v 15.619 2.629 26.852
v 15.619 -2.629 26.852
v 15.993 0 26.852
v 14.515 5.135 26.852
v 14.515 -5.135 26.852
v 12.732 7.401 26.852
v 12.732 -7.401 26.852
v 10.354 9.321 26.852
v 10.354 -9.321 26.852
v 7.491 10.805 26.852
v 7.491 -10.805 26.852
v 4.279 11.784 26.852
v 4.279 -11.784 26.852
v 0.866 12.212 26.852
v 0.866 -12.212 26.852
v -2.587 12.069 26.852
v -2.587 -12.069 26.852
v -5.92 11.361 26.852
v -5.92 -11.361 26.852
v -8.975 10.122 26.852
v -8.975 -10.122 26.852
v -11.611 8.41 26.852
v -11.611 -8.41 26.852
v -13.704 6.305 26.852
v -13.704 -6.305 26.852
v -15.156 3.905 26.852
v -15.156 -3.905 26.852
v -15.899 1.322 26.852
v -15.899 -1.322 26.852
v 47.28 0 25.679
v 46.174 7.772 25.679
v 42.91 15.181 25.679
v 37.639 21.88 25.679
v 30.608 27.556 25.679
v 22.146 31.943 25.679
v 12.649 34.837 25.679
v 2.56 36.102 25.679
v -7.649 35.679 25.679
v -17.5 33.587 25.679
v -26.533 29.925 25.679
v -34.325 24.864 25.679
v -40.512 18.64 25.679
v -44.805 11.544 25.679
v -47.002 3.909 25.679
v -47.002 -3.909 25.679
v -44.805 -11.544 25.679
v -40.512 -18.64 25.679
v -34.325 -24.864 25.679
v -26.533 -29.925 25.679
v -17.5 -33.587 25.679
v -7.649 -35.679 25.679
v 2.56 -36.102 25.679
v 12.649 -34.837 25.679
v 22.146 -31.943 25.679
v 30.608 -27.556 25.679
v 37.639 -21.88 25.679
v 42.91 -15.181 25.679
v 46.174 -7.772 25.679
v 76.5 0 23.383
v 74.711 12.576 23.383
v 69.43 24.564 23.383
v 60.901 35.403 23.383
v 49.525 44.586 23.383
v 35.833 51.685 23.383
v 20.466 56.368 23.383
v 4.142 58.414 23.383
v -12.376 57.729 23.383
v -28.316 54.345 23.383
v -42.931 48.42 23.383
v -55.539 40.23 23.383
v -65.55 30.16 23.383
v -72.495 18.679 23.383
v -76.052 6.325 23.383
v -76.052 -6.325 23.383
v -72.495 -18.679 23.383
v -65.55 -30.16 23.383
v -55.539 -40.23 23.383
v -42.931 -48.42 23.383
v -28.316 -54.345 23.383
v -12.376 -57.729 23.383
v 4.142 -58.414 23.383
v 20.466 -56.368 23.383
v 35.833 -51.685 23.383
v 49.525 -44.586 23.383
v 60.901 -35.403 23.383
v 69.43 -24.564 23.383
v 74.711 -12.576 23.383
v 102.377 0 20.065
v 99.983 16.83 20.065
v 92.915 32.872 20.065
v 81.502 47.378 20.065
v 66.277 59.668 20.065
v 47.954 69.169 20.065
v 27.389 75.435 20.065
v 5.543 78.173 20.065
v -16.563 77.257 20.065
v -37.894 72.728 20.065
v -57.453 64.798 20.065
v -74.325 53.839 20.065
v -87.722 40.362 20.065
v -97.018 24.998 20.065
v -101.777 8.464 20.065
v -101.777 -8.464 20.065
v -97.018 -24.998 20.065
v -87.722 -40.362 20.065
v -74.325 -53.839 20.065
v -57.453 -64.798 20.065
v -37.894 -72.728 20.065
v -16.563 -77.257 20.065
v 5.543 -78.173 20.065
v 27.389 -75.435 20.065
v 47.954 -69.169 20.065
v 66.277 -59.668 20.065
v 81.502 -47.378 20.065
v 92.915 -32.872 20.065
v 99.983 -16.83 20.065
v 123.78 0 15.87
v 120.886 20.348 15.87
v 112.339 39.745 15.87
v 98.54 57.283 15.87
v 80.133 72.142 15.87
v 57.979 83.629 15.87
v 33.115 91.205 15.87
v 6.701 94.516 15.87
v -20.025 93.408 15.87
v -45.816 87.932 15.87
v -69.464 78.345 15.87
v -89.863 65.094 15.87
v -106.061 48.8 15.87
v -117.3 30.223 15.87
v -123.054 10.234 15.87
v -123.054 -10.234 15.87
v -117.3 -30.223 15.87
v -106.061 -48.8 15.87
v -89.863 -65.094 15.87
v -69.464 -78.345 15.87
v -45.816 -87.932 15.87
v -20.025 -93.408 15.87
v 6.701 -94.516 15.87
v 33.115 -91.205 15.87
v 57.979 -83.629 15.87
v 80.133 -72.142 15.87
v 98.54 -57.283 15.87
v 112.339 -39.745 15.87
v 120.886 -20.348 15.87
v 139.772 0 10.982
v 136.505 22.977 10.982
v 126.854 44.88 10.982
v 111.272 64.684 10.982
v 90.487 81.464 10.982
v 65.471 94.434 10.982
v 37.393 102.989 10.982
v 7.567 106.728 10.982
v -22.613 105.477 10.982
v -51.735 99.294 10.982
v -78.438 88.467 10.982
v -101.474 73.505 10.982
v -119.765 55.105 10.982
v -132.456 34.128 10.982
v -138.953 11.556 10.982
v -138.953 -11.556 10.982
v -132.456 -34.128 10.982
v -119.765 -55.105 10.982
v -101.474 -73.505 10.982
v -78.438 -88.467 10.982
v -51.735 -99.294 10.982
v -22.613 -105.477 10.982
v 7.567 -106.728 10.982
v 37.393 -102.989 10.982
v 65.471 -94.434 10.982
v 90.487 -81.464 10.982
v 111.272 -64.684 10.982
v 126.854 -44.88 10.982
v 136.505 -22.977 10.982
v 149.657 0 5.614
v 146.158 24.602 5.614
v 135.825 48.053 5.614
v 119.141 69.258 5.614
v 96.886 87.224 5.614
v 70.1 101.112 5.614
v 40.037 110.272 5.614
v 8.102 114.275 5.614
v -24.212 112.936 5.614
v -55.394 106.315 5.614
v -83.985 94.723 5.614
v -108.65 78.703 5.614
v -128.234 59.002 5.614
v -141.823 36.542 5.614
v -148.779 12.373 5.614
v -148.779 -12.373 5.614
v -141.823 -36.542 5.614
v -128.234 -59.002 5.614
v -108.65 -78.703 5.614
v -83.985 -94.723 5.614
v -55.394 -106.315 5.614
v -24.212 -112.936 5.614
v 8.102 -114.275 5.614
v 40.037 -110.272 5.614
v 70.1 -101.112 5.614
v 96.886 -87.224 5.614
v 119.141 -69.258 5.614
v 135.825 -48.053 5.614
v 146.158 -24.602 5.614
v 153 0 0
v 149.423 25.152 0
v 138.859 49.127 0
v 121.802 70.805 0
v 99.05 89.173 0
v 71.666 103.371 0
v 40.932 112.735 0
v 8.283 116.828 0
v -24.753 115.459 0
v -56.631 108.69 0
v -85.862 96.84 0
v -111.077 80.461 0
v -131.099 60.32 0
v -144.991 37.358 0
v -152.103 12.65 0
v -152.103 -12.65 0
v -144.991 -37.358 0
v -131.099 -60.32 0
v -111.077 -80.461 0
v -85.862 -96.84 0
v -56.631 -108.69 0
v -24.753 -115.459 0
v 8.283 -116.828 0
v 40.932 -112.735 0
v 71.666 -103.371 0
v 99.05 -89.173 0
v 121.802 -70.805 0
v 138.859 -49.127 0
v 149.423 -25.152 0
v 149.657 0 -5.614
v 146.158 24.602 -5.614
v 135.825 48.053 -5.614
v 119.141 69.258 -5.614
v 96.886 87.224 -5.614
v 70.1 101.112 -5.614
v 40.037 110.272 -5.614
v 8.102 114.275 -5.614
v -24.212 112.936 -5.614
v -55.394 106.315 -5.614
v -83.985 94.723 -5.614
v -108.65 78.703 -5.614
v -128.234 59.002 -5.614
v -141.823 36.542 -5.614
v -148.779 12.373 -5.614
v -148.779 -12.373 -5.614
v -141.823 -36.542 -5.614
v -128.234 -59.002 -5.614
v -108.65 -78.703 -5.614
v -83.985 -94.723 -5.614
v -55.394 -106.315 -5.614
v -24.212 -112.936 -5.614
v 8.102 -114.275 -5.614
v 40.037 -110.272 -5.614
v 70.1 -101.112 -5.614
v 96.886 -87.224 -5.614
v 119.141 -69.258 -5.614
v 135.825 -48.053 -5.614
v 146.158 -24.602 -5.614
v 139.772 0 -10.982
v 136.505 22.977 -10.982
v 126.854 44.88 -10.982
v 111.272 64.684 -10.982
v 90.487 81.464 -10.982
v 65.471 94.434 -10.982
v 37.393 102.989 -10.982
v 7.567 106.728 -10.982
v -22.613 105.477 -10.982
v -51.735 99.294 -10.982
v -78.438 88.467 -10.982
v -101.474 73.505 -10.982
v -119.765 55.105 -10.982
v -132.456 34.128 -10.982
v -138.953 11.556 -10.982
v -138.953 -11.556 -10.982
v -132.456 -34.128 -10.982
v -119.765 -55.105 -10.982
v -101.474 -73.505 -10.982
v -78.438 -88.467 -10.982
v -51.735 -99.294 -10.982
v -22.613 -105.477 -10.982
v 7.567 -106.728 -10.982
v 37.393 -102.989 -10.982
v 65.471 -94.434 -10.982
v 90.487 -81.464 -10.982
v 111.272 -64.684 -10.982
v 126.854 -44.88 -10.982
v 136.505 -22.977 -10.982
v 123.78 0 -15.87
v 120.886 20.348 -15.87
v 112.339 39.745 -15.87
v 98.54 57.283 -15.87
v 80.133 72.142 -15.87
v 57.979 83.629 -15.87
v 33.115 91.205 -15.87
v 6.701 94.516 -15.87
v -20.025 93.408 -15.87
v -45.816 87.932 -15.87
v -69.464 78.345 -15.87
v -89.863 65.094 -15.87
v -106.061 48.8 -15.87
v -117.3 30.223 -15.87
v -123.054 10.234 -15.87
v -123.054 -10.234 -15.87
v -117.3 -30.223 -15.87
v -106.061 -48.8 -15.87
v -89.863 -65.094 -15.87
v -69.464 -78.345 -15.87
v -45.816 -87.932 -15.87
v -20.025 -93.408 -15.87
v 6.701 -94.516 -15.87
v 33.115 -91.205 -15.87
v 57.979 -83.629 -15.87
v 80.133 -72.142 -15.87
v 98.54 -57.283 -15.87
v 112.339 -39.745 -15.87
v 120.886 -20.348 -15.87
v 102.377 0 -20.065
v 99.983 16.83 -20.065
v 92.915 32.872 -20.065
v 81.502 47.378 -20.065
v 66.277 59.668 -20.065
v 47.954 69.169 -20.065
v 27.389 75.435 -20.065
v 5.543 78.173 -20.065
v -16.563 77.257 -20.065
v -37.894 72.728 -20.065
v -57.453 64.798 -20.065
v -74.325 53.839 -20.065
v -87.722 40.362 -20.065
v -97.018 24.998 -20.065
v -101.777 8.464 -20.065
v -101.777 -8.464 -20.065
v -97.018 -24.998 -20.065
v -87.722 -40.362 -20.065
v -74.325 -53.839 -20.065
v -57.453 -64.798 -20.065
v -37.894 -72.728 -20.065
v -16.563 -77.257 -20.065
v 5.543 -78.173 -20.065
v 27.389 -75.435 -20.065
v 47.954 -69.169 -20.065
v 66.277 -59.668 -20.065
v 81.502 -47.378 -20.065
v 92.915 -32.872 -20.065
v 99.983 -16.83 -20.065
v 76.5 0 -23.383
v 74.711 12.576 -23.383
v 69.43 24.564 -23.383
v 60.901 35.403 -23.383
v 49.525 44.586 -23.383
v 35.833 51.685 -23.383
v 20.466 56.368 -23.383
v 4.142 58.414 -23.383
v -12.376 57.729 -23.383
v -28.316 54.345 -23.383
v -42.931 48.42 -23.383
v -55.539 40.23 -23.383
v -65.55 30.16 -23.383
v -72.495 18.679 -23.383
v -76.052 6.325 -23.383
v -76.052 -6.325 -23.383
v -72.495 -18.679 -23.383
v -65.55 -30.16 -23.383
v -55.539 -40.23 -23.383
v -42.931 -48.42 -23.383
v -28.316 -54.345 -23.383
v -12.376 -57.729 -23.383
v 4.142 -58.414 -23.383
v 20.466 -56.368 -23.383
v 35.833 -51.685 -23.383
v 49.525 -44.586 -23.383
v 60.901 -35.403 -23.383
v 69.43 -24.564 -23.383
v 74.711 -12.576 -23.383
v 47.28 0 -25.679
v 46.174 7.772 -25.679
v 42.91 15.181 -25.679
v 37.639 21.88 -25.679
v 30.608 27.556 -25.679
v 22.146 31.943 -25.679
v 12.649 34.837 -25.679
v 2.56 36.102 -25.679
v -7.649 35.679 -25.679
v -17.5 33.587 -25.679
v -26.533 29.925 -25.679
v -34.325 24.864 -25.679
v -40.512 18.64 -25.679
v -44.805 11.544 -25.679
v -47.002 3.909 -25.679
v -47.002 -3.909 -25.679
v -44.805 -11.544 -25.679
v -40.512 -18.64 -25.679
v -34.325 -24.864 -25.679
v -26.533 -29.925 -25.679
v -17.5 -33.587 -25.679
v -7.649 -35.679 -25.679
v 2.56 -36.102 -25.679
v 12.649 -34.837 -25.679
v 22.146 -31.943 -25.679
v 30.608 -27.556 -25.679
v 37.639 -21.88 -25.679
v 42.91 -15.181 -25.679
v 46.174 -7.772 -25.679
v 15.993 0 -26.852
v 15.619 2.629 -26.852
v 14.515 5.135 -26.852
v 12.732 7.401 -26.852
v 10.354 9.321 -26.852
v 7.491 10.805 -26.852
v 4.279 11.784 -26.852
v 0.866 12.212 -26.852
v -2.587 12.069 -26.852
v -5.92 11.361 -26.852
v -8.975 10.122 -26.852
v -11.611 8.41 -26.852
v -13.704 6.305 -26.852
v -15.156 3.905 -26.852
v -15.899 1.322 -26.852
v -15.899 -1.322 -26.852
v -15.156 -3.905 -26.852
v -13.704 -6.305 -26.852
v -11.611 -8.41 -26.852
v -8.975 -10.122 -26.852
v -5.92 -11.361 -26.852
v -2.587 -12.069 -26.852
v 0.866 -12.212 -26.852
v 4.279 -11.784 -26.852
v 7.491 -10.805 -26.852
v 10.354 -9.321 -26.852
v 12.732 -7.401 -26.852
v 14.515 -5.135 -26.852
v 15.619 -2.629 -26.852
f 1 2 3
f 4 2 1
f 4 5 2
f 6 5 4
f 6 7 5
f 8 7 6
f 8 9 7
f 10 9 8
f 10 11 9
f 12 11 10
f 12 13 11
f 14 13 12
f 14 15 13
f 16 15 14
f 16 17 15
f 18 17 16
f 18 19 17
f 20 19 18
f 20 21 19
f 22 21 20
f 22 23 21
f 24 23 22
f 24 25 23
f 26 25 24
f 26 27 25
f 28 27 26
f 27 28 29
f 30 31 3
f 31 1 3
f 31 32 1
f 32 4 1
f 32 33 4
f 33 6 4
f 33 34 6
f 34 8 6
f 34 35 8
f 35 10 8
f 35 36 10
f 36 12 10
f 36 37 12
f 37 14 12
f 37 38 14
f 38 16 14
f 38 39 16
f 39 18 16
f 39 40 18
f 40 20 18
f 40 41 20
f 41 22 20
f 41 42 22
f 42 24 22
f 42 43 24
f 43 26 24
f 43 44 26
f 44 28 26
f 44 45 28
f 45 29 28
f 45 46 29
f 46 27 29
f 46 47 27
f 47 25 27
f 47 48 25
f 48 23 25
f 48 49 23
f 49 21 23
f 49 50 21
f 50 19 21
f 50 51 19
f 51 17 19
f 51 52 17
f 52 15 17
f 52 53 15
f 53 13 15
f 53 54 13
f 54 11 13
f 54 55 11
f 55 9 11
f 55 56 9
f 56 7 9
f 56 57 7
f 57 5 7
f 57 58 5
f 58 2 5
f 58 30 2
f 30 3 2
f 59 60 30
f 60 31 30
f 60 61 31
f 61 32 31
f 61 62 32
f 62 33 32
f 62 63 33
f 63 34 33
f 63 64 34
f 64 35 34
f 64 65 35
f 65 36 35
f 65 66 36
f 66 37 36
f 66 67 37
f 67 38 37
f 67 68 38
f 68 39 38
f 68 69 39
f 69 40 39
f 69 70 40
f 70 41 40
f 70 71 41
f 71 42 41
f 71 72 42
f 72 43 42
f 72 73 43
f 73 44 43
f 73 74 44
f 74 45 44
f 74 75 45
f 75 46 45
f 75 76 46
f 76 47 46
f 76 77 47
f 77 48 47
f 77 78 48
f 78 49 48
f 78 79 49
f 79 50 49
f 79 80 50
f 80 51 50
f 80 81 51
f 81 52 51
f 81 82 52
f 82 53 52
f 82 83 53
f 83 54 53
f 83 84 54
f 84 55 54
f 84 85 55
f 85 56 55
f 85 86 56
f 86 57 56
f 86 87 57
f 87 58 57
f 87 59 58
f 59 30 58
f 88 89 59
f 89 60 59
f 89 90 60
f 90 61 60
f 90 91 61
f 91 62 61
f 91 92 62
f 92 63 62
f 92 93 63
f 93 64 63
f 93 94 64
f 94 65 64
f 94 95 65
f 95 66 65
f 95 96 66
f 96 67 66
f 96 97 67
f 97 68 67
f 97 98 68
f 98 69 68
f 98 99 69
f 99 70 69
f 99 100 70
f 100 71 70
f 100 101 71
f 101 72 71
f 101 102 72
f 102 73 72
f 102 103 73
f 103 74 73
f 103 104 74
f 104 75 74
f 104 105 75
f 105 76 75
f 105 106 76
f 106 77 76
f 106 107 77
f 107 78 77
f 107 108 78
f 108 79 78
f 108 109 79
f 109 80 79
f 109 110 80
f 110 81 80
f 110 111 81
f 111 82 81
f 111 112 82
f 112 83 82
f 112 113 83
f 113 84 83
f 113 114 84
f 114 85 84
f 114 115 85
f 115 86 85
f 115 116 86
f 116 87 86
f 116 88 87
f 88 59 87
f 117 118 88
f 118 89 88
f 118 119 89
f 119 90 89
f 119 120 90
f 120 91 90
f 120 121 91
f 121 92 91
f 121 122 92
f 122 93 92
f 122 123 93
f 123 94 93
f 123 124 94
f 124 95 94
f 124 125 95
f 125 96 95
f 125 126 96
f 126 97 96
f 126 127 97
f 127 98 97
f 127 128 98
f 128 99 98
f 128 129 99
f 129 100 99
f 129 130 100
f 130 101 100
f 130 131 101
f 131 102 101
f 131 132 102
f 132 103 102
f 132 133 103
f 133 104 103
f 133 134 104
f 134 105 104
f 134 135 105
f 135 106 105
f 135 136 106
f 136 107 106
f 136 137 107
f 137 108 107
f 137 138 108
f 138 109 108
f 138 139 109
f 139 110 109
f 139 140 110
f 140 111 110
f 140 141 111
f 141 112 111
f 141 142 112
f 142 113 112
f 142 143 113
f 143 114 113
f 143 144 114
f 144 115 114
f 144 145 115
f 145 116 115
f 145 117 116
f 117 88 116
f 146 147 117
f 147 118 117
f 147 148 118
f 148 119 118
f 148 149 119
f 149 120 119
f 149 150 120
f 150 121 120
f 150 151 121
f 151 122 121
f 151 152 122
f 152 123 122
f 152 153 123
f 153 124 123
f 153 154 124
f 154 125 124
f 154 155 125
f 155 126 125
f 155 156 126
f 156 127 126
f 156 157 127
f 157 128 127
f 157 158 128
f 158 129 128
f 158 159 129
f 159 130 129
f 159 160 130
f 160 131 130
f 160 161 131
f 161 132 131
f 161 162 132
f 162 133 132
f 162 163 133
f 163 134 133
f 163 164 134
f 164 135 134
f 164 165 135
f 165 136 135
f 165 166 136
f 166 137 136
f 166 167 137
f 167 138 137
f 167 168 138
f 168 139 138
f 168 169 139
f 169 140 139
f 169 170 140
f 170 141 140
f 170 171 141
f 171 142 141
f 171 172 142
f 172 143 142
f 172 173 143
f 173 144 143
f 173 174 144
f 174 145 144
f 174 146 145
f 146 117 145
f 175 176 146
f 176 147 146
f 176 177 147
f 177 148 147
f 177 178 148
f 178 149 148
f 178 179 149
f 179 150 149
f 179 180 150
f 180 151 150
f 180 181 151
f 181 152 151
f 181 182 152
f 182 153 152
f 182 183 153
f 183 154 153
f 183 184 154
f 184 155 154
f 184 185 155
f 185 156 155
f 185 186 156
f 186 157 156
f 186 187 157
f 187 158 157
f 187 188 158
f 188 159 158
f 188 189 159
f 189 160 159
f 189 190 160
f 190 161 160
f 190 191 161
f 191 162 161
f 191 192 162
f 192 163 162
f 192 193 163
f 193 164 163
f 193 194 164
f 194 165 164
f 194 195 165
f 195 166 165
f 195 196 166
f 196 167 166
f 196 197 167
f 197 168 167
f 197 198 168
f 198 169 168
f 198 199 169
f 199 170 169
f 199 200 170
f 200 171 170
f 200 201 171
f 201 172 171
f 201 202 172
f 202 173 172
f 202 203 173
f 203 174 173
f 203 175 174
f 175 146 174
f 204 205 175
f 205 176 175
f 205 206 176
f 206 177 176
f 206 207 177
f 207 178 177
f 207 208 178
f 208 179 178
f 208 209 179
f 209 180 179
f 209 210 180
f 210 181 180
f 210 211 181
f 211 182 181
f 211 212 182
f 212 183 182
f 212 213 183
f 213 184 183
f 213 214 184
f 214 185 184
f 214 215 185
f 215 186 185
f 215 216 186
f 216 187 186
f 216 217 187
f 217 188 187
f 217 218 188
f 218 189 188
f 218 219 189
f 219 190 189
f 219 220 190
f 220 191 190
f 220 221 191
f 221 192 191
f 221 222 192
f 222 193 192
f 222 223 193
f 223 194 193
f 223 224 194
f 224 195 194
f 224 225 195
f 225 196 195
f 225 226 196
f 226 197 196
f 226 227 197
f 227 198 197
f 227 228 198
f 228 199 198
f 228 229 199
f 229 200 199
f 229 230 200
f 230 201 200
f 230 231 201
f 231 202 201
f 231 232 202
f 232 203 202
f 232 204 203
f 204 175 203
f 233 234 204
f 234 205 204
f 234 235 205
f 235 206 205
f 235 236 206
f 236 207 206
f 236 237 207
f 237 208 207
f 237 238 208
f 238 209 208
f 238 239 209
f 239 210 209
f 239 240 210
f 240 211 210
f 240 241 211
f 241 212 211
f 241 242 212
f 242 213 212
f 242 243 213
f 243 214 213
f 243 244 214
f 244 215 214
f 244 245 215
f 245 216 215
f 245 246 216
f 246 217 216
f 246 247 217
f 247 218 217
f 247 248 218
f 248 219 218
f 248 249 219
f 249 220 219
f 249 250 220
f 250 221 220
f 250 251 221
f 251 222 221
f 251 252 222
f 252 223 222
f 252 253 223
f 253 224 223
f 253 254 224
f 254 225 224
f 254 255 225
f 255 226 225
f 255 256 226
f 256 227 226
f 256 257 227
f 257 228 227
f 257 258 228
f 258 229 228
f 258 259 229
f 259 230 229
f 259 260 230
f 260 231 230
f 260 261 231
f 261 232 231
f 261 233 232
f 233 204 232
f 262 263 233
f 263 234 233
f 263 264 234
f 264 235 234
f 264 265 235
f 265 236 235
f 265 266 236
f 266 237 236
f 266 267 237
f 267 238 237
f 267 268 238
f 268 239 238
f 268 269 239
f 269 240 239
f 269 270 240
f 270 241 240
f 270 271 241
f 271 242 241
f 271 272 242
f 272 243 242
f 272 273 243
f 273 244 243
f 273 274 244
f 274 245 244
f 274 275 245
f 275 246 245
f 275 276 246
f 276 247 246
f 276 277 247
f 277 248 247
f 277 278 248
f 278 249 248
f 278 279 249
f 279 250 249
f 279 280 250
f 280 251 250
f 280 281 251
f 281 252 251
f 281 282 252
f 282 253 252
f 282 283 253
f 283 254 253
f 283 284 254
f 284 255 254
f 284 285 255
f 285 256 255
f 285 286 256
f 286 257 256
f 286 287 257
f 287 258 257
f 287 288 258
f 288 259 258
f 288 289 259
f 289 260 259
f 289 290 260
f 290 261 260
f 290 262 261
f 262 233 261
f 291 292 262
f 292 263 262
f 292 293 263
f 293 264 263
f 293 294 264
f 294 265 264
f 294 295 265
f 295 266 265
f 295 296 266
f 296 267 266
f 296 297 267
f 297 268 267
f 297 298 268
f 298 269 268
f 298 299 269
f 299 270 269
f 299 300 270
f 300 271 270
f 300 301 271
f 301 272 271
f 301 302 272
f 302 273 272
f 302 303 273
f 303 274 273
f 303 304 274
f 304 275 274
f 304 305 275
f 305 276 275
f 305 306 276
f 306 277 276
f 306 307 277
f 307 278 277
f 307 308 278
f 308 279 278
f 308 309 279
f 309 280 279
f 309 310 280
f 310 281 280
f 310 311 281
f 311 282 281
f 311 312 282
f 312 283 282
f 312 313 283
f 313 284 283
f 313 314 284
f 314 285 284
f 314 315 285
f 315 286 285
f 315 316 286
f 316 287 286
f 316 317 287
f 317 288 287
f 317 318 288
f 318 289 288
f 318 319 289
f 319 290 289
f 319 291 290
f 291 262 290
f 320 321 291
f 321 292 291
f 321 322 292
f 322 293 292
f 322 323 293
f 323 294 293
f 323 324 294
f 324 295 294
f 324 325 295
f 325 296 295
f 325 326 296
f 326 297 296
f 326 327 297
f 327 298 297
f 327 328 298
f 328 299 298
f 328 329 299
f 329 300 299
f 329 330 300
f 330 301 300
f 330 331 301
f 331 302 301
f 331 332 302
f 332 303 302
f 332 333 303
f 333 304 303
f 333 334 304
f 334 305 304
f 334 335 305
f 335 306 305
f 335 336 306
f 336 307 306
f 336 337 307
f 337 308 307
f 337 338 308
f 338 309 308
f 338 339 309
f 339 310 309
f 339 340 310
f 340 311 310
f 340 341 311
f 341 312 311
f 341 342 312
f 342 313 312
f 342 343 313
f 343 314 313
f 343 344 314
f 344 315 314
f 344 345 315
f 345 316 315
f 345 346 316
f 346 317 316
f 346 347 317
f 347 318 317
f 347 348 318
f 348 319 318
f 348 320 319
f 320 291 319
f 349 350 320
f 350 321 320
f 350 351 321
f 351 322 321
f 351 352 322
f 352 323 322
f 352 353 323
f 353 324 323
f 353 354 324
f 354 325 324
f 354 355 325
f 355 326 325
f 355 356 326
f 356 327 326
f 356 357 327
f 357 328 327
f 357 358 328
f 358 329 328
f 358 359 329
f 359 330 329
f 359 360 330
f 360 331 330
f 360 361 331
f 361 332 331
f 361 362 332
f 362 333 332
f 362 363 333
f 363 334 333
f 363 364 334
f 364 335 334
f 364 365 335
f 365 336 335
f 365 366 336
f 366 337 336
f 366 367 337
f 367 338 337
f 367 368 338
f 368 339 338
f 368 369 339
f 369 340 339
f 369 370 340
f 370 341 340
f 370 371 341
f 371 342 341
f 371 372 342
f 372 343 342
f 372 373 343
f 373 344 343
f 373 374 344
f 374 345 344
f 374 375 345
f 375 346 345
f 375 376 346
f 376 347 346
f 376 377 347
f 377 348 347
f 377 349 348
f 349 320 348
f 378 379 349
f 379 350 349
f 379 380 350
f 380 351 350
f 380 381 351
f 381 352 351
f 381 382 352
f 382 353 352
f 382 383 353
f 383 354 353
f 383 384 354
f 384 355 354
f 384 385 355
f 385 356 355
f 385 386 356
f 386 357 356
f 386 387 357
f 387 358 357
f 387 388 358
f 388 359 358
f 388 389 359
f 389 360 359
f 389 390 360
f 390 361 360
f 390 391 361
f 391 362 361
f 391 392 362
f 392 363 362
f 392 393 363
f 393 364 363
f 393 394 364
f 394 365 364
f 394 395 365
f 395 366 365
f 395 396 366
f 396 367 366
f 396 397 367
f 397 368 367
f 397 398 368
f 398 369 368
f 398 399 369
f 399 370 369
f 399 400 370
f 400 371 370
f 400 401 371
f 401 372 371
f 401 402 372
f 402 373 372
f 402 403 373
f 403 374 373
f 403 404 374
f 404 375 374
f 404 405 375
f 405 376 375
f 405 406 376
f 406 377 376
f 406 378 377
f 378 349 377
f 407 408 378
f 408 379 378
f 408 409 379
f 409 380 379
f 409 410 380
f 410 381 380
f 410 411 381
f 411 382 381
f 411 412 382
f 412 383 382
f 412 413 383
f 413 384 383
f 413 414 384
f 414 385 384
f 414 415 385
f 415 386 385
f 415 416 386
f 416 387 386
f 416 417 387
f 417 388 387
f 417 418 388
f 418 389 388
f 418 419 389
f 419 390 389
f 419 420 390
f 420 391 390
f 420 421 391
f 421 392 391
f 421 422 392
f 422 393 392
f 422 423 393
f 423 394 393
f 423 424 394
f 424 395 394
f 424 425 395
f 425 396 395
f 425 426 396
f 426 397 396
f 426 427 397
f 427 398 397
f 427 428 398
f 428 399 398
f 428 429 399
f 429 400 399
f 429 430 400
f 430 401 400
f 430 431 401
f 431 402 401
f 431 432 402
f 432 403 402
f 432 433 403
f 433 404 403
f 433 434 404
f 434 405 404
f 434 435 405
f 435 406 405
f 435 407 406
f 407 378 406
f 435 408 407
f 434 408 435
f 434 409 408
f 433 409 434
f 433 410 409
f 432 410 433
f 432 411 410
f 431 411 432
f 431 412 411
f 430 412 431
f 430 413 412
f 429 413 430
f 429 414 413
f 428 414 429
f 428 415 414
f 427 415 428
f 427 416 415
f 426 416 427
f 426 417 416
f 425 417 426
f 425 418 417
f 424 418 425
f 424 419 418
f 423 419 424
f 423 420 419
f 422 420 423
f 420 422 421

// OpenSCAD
// Generated by SolidPython 1.0.1 on 2020-07-29 00:46:53


scale(v = [17, 13, 3]) {
	sphere(r = 9);
}
/***********************************************
*********      SolidPython code:      **********
************************************************
 
# import packages: SolidPython
from solid import *
from solid.utils import *
from itertools import chain, combinations, permutations


class Resize:

    def __init__(self, scad_file):
        self.scad_file = scad_file
        #self.scad_file = import_scad(scad_file)
        # cone/cylinder param:
        self.r1 = 0
        self.r2 = 0
        self.h = 0
        # rectangular prism param:
        self.w = 0
        self.l = 0
        # ellipse param:
        self.r = 0

    # import OpenScad code (file name corresponds to shape)


    # classify shape + parameters
    def assign(self, param1, param2, param3):
        if self.scad_file == 'cone.scad':
            self.r1 = param1
            self.r2 = param2
            self.h = param3
        elif self.scad_file == 'cylinder.scad':
            self.r1 = param1
            self.r2 = param2
            self.h = param3
        elif self.scad_file == 'rectangularPrism.scad':
            self.h = param1
            self.l = param2
            self.w = param3
        else:
            self.r = param1
            self.h = param2

    # resize parameters
    def iterate(self):
        x = range(3, 20, 2)
        i = 1
        if self.scad_file == 'cone.scad':
            tempList = list(permutations(x, 2))
            for temp in tempList:
                param1 = temp[0]
                param2 = temp[1]
                filepath = 'produced_scad_files/' + 'cone' + str(param1) + '_' + str(param2) + '_' + '.scad'
                scad_render_to_file(cylinder(h=param1, r1=param2, r2=0), filepath)

        elif self.scad_file == 'cylinder.scad':
            tempList = list(permutations(x, 3))
            for temp in tempList:
                param1 = temp[0]
                param2 = temp[1]
                filepath = 'produced_scad_files/' + 'cylinder' + str(param1) + '_' + str(param2) + '_' + '.scad'
                scad_render_to_file(cylinder(h=param1, r1=param2, r2=param2), filepath)

        elif self.scad_file == 'rectangularPrism.scad':
            tempList = list(permutations(x, 3))
            for temp in tempList:
                param1 = temp[0]
                param2 = temp[1]
                param3 = temp[2]
                filepath = 'produced_scad_files/' + 'rectangularPrism' + str(param1) + '_' + str(param2) + '_' + str(
                    param3) + '.scad'
                scad_render_to_file(cube(size=(param1, param2, param3)), filepath)

        elif self.scad_file == 'ellipse.scad':
            tempList = list(permutations(x, 4))
            for temp in tempList:
                param1 = temp[0]
                param2 = temp[1]
                param3 = temp[2]
                param4 = temp[3]
                filepath = 'produced_scad_files/' + 'ellipse' + str(param1) + '_' + str(param2) + '_' + str(param3) + '_' + str(param4) + '.scad'
                scad_render_to_file(scale([param1, param2, param3])(sphere(r=param4)), filepath)

    def render_to_scadfile(self):
        scad_render_to_file(scad, 'example.scad') 
 
************************************************/
